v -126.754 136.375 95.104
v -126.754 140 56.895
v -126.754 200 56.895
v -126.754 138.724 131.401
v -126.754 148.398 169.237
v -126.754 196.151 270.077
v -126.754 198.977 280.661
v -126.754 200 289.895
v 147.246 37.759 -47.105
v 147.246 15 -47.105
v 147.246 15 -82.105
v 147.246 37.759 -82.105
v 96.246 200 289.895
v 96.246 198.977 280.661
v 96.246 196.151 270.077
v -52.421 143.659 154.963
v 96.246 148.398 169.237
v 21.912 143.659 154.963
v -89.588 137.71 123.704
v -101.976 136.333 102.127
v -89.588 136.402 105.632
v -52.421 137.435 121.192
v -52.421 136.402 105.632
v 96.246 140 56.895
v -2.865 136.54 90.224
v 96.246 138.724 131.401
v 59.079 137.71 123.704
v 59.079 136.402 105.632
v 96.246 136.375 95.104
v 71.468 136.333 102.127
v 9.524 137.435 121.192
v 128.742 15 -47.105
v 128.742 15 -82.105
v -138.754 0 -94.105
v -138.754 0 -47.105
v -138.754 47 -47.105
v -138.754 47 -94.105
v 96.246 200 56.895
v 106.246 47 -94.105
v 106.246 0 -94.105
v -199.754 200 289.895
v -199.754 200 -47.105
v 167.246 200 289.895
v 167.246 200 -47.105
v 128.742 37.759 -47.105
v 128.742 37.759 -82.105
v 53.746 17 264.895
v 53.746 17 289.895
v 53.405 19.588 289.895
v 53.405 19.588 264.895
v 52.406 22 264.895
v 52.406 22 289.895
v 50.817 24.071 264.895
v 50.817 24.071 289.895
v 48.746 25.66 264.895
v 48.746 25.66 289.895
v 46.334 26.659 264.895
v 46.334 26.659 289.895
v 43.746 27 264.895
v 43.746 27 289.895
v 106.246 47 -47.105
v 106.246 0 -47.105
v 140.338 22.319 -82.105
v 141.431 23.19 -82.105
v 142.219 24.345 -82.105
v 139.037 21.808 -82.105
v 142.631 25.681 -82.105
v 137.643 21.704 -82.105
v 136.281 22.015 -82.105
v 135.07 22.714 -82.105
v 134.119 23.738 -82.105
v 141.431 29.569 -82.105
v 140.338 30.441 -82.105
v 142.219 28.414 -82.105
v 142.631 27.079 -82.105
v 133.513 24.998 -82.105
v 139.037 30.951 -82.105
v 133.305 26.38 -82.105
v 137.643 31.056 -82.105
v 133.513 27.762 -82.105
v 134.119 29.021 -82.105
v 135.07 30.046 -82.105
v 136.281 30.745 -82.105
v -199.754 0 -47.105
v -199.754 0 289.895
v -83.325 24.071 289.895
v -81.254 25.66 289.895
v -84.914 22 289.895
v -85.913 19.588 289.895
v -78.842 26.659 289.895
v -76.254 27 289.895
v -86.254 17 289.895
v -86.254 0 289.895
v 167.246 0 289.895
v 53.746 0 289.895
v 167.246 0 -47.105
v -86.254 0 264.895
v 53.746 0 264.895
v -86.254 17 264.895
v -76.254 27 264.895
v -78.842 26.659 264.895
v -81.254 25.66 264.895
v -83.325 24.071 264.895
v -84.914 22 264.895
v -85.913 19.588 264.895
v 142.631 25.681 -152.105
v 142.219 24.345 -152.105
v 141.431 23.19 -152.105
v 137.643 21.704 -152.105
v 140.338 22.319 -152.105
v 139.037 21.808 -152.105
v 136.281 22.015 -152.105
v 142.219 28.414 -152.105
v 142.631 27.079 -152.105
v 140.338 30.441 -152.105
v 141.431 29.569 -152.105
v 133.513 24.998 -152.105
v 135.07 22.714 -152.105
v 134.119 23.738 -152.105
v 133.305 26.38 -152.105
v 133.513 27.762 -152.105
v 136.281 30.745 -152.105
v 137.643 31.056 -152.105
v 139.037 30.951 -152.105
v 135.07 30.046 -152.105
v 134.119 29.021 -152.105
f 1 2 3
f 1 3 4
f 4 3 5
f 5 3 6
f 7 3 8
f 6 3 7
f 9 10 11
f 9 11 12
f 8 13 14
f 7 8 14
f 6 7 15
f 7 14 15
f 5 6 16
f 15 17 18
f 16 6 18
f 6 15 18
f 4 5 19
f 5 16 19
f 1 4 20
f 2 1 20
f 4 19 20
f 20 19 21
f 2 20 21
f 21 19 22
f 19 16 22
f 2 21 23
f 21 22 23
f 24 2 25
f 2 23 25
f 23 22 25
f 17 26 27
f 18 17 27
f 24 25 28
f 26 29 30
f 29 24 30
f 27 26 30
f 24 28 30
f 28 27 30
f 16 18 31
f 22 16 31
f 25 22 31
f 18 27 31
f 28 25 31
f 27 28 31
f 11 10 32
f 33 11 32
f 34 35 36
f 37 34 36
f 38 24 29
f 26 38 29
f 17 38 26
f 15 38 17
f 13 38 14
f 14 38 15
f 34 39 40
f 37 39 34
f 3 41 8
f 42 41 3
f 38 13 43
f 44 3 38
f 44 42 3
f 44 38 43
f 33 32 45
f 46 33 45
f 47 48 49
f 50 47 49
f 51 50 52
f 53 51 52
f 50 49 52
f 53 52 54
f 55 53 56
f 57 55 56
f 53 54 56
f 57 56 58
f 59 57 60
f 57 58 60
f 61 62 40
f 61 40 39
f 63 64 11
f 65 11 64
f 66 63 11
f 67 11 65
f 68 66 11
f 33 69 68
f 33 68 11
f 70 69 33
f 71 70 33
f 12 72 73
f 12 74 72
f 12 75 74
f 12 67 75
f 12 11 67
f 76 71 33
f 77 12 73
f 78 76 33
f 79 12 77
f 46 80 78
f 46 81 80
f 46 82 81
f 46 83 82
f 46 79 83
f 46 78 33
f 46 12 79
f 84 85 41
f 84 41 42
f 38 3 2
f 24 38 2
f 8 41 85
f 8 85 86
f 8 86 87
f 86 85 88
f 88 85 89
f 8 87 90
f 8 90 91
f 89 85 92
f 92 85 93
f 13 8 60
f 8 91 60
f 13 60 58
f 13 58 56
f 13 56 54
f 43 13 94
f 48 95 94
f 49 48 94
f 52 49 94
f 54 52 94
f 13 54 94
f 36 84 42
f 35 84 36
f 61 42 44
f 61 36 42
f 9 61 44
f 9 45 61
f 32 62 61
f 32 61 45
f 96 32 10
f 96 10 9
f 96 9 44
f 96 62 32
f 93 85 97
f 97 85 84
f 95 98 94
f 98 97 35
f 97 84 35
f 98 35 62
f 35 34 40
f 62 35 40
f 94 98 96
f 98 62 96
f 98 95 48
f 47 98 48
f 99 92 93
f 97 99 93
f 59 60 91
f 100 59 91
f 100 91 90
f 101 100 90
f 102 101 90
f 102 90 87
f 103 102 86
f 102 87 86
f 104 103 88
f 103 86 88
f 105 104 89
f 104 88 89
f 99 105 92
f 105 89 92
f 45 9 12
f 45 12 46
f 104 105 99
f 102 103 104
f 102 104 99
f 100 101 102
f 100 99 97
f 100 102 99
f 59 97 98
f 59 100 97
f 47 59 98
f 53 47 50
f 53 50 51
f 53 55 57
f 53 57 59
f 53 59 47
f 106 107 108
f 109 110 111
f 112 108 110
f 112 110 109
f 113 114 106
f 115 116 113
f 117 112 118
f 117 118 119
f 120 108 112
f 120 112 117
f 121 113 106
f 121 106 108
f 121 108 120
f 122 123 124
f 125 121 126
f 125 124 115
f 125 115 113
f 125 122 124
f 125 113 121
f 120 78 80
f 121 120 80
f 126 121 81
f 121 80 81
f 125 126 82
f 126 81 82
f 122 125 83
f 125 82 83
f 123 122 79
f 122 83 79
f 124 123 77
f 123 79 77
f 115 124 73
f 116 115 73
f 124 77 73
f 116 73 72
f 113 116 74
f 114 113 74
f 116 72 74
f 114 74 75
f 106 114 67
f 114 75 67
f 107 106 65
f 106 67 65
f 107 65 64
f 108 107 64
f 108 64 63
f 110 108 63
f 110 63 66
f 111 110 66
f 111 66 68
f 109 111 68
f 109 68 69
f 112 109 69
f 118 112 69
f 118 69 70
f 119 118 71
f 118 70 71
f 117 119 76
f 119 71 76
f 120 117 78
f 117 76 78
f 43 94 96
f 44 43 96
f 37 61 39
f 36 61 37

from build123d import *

# Parameters (mm, degrees)
SKETCH_1_W          = 367
SKETCH_1_H          = 337
EXTRUDE_1_DEPTH     = 200
SKETCH_2_W          = 245
SKETCH_2_H          = 47
EXTRUDE_2_DEPTH     = 47
SKETCH_3_W          = 18.503948035
SKETCH_3_H          = 22.759447516
EXTRUDE_3_DEPTH     = 35
SKETCH_4_R          = 4.689122638
EXTRUDE_4_DEPTH     = 70
CUT_EXTRUDE_1_DEPTH = 25
CUT_EXTRUDE_2_DEPTH = 223


with BuildPart() as part:
    # Эскиз1 → Бобышка-Вытянуть1 (new body)
    with BuildSketch(Plane(origin=(0, 0, 0), x_dir=(1, 0, 0), z_dir=(0, 1, 0))):
        with Locations((-16.254231815, -121.394753304)):
            Rectangle(SKETCH_1_W, SKETCH_1_H)
    extrude(amount=EXTRUDE_1_DEPTH)

    # Эскиз2 → Бобышка-Вытянуть2 (add)
    with BuildSketch(Plane(origin=(0, 0, -47.105246696), x_dir=(-1, 0, 0), z_dir=(0, 0, -1))):
        with Locations((16.254231815, 23.5)):
            Rectangle(SKETCH_2_W, SKETCH_2_H)
    extrude(amount=EXTRUDE_2_DEPTH)

    # Эскиз3 → Бобышка-Вытянуть3 (add)
    with BuildSketch(Plane(origin=(0, 0, -47.105246696), x_dir=(-1, 0, 0), z_dir=(0, 0, -1))):
        with Locations((-137.993794167, 26.379723758)):
            Rectangle(SKETCH_3_W, SKETCH_3_H)
    extrude(amount=EXTRUDE_3_DEPTH)

    # Эскиз4 → Бобышка-Вытянуть4 (add)
    with BuildSketch(Plane(origin=(0, 0, -82.105246696), x_dir=(-1, 0, 0), z_dir=(0, 0, -1))):
        with Locations((-137.993794168, 26.379723758)):
            Circle(SKETCH_4_R)
    extrude(amount=EXTRUDE_4_DEPTH)

    # Эскиз5 → Вырез-Вытянуть1 (cut)
    with BuildSketch(Plane.XY.offset(289.894753304)):
        with BuildLine():
            Line((-86.254231815, 0), (53.745768185, 0))
            Line((53.745768185, 0), (53.745768185, 17))
            ThreePointArc((53.745768185, 17), (50.816835997, 24.071067812), (43.745768185, 27))
            Line((43.745768185, 27), (-76.254231815, 27))
            ThreePointArc((-76.254231815, 27), (-83.325299626, 24.071067812), (-86.254231815, 17))
            Line((-86.254231815, 17), (-86.254231815, 0))
        make_face()
    extrude(amount=-CUT_EXTRUDE_1_DEPTH, mode=Mode.SUBTRACT)

    # Эскиз6 → Вырез-Вытянуть2 (cut)
    with BuildSketch(Plane(origin=(96.245768185, 0, 0), x_dir=(0, 0, -1), z_dir=(1, 0, 0))):
        with BuildLine():
            Line((-289.894753304, 200), (-56.894753304, 200))
            Line((-56.894753304, 200), (-56.894753304, 140))
            add(Edge.make_bspline(
                [(-289.894753304, 200), (-255.905913973, 199.483070544), (-195.675702754, 150.542684271), (-111.630124679, 134.680175733), (-84.590503935, 135.886366382), (-56.894753304, 140)],
                knots=[0, 0, 0, 0, 0.585078831, 0.685078831, 1, 1, 1, 1], degree=3))
        make_face()
    extrude(amount=-CUT_EXTRUDE_2_DEPTH, mode=Mode.SUBTRACT)


solid = part.part
